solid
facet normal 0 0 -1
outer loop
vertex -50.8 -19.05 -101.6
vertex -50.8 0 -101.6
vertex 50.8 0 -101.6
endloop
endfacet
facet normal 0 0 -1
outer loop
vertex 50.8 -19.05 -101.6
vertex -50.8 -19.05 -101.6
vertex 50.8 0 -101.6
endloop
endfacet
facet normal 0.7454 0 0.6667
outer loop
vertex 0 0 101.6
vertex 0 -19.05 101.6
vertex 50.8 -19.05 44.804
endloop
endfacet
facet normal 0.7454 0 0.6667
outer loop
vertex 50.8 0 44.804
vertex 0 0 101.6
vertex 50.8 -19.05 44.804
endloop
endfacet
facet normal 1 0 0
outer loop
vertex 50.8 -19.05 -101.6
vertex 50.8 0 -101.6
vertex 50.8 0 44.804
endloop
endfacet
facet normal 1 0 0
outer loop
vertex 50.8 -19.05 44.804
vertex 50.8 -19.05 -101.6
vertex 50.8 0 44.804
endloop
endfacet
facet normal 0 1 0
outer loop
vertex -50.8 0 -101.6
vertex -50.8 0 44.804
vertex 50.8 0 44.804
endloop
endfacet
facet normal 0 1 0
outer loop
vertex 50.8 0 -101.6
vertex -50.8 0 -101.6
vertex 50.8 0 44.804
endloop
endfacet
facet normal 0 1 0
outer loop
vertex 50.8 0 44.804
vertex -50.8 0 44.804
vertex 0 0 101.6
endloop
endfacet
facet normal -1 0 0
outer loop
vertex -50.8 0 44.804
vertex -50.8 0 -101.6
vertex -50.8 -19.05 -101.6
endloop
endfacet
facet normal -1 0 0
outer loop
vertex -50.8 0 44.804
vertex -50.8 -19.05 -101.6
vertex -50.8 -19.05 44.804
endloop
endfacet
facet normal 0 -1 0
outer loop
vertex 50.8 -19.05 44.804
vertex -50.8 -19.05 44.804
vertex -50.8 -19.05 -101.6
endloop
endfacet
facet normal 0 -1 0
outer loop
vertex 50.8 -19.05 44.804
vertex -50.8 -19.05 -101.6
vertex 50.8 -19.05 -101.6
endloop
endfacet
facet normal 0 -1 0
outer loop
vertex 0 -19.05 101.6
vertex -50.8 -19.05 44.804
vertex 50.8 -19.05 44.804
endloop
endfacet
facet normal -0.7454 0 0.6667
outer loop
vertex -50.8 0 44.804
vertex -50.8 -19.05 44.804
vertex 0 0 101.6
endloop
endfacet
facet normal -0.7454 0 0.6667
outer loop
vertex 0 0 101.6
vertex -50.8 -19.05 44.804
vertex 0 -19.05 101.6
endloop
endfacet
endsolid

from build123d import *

# Parameters (mm, degrees)
F0_W     = 101.6
F0_H     = 203.2
F1_DEPTH = 19.05
F3_DEPTH = 19.051


with BuildPart() as f1:
    # F0 (on Front) → F1 (new body)
    with BuildSketch(Plane.XZ):
        Rectangle(F0_W, F0_H)
    extrude(amount=F1_DEPTH)

    # F2 (on face) → F3 (cut, through all)
    with BuildSketch(Plane.XZ.offset(19.05)):
        Polygon((-50.8, 44.803873), (0, 101.6), (-50.8, 101.6), align=None)
        Polygon((50.8, 101.6), (0, 101.6), (50.8, 44.803873), align=None)
    extrude(amount=-F3_DEPTH, mode=Mode.SUBTRACT)


solid = f1.part
